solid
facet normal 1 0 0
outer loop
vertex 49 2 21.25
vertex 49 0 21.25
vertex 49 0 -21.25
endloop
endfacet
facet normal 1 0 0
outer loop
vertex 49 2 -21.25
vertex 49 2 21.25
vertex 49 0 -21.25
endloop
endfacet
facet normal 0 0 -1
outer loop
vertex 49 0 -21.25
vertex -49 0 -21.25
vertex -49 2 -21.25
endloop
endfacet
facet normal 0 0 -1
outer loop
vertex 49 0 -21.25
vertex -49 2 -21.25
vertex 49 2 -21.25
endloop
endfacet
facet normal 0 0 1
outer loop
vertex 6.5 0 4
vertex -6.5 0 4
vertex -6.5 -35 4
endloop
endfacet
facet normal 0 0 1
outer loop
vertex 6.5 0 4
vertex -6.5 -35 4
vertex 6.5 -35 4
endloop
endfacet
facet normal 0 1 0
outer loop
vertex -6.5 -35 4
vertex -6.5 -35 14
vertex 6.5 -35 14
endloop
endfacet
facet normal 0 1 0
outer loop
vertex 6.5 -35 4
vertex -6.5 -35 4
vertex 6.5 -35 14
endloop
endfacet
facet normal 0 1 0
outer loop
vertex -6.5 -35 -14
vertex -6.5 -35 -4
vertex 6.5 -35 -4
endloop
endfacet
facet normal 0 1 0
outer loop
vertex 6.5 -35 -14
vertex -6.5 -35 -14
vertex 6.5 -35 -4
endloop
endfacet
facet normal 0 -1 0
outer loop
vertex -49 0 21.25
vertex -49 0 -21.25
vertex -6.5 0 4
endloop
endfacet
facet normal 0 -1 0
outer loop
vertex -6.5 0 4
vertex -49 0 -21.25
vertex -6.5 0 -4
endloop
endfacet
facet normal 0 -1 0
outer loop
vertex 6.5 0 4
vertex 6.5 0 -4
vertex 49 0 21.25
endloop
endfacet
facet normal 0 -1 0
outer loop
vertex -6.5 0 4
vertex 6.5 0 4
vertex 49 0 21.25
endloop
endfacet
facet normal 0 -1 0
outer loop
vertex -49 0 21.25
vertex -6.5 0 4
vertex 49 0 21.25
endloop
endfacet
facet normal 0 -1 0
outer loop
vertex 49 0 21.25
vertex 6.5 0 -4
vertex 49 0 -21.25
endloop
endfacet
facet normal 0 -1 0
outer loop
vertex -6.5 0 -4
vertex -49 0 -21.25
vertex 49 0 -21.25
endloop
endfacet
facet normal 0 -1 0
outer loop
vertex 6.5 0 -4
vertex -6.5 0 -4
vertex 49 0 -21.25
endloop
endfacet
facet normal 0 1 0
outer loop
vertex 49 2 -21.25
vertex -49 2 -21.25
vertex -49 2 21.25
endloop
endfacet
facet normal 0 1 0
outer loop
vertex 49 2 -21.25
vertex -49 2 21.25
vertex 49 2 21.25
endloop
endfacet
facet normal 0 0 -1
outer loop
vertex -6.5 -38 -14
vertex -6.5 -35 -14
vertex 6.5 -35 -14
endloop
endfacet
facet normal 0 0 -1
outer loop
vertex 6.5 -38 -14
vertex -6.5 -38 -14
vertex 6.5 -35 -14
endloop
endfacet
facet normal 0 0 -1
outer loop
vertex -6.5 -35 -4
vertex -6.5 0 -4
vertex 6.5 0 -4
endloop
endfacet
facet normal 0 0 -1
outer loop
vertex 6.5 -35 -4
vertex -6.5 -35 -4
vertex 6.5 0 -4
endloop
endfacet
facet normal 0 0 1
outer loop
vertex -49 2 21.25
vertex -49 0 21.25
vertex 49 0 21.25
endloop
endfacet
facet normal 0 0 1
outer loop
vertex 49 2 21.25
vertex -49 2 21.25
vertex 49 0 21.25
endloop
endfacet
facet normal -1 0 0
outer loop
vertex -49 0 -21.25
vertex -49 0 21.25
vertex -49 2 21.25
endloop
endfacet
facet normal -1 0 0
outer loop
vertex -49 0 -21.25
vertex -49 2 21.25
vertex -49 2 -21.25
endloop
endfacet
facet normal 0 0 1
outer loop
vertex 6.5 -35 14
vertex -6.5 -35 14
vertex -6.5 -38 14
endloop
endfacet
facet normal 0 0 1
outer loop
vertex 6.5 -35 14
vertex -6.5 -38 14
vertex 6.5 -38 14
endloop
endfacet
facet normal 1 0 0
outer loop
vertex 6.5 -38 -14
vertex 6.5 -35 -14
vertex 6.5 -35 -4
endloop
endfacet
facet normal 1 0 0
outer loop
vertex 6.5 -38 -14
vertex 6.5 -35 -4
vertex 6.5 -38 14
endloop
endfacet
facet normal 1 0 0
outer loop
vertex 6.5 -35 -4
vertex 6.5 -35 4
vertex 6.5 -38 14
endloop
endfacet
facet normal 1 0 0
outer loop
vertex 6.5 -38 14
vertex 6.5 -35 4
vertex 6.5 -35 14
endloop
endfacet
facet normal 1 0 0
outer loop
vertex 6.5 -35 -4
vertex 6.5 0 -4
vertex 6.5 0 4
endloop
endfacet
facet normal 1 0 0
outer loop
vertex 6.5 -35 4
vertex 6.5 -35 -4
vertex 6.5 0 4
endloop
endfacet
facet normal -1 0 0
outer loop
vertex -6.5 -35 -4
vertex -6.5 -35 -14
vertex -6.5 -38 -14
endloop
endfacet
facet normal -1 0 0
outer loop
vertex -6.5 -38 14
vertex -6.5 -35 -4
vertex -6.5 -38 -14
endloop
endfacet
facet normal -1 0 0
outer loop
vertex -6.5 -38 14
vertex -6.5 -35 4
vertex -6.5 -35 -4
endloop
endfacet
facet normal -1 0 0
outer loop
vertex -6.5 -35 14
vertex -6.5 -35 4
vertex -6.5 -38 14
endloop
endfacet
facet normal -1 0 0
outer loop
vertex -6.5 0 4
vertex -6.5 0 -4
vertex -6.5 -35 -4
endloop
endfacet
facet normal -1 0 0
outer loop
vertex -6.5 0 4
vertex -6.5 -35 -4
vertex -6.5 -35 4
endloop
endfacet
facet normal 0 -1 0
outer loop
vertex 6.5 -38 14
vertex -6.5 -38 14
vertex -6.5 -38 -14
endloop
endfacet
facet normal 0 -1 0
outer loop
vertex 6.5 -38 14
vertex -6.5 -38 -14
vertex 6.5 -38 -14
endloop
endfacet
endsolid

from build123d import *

# Parameters (mm, degrees)
SKETCH1_W           = 98
SKETCH1_H           = 42.5
BOSS_EXTRUDE1_DEPTH = 2
SKETCH2_W           = 13
SKETCH2_H           = 8
BOSS_EXTRUDE2_DEPTH = 35
SKETCH3_W           = 13
SKETCH3_H           = 28
BOSS_EXTRUDE3_DEPTH = 3


with BuildPart() as part:
    # Sketch1 → Boss-Extrude1 (new body)
    with BuildSketch(Plane(origin=(0, 0, 0), x_dir=(1, 0, 0), z_dir=(0, 1, 0))):
        Rectangle(SKETCH1_W, SKETCH1_H)
    extrude(amount=BOSS_EXTRUDE1_DEPTH)

    # Sketch2 → Boss-Extrude2 (add)
    with BuildSketch(Plane.XZ):
        Rectangle(SKETCH2_W, SKETCH2_H)
    extrude(amount=BOSS_EXTRUDE2_DEPTH)

    # Sketch3 → Boss-Extrude3 (add)
    with BuildSketch(Plane.XZ.offset(35)):
        Rectangle(SKETCH3_W, SKETCH3_H)
    extrude(amount=BOSS_EXTRUDE3_DEPTH)


solid = part.part
